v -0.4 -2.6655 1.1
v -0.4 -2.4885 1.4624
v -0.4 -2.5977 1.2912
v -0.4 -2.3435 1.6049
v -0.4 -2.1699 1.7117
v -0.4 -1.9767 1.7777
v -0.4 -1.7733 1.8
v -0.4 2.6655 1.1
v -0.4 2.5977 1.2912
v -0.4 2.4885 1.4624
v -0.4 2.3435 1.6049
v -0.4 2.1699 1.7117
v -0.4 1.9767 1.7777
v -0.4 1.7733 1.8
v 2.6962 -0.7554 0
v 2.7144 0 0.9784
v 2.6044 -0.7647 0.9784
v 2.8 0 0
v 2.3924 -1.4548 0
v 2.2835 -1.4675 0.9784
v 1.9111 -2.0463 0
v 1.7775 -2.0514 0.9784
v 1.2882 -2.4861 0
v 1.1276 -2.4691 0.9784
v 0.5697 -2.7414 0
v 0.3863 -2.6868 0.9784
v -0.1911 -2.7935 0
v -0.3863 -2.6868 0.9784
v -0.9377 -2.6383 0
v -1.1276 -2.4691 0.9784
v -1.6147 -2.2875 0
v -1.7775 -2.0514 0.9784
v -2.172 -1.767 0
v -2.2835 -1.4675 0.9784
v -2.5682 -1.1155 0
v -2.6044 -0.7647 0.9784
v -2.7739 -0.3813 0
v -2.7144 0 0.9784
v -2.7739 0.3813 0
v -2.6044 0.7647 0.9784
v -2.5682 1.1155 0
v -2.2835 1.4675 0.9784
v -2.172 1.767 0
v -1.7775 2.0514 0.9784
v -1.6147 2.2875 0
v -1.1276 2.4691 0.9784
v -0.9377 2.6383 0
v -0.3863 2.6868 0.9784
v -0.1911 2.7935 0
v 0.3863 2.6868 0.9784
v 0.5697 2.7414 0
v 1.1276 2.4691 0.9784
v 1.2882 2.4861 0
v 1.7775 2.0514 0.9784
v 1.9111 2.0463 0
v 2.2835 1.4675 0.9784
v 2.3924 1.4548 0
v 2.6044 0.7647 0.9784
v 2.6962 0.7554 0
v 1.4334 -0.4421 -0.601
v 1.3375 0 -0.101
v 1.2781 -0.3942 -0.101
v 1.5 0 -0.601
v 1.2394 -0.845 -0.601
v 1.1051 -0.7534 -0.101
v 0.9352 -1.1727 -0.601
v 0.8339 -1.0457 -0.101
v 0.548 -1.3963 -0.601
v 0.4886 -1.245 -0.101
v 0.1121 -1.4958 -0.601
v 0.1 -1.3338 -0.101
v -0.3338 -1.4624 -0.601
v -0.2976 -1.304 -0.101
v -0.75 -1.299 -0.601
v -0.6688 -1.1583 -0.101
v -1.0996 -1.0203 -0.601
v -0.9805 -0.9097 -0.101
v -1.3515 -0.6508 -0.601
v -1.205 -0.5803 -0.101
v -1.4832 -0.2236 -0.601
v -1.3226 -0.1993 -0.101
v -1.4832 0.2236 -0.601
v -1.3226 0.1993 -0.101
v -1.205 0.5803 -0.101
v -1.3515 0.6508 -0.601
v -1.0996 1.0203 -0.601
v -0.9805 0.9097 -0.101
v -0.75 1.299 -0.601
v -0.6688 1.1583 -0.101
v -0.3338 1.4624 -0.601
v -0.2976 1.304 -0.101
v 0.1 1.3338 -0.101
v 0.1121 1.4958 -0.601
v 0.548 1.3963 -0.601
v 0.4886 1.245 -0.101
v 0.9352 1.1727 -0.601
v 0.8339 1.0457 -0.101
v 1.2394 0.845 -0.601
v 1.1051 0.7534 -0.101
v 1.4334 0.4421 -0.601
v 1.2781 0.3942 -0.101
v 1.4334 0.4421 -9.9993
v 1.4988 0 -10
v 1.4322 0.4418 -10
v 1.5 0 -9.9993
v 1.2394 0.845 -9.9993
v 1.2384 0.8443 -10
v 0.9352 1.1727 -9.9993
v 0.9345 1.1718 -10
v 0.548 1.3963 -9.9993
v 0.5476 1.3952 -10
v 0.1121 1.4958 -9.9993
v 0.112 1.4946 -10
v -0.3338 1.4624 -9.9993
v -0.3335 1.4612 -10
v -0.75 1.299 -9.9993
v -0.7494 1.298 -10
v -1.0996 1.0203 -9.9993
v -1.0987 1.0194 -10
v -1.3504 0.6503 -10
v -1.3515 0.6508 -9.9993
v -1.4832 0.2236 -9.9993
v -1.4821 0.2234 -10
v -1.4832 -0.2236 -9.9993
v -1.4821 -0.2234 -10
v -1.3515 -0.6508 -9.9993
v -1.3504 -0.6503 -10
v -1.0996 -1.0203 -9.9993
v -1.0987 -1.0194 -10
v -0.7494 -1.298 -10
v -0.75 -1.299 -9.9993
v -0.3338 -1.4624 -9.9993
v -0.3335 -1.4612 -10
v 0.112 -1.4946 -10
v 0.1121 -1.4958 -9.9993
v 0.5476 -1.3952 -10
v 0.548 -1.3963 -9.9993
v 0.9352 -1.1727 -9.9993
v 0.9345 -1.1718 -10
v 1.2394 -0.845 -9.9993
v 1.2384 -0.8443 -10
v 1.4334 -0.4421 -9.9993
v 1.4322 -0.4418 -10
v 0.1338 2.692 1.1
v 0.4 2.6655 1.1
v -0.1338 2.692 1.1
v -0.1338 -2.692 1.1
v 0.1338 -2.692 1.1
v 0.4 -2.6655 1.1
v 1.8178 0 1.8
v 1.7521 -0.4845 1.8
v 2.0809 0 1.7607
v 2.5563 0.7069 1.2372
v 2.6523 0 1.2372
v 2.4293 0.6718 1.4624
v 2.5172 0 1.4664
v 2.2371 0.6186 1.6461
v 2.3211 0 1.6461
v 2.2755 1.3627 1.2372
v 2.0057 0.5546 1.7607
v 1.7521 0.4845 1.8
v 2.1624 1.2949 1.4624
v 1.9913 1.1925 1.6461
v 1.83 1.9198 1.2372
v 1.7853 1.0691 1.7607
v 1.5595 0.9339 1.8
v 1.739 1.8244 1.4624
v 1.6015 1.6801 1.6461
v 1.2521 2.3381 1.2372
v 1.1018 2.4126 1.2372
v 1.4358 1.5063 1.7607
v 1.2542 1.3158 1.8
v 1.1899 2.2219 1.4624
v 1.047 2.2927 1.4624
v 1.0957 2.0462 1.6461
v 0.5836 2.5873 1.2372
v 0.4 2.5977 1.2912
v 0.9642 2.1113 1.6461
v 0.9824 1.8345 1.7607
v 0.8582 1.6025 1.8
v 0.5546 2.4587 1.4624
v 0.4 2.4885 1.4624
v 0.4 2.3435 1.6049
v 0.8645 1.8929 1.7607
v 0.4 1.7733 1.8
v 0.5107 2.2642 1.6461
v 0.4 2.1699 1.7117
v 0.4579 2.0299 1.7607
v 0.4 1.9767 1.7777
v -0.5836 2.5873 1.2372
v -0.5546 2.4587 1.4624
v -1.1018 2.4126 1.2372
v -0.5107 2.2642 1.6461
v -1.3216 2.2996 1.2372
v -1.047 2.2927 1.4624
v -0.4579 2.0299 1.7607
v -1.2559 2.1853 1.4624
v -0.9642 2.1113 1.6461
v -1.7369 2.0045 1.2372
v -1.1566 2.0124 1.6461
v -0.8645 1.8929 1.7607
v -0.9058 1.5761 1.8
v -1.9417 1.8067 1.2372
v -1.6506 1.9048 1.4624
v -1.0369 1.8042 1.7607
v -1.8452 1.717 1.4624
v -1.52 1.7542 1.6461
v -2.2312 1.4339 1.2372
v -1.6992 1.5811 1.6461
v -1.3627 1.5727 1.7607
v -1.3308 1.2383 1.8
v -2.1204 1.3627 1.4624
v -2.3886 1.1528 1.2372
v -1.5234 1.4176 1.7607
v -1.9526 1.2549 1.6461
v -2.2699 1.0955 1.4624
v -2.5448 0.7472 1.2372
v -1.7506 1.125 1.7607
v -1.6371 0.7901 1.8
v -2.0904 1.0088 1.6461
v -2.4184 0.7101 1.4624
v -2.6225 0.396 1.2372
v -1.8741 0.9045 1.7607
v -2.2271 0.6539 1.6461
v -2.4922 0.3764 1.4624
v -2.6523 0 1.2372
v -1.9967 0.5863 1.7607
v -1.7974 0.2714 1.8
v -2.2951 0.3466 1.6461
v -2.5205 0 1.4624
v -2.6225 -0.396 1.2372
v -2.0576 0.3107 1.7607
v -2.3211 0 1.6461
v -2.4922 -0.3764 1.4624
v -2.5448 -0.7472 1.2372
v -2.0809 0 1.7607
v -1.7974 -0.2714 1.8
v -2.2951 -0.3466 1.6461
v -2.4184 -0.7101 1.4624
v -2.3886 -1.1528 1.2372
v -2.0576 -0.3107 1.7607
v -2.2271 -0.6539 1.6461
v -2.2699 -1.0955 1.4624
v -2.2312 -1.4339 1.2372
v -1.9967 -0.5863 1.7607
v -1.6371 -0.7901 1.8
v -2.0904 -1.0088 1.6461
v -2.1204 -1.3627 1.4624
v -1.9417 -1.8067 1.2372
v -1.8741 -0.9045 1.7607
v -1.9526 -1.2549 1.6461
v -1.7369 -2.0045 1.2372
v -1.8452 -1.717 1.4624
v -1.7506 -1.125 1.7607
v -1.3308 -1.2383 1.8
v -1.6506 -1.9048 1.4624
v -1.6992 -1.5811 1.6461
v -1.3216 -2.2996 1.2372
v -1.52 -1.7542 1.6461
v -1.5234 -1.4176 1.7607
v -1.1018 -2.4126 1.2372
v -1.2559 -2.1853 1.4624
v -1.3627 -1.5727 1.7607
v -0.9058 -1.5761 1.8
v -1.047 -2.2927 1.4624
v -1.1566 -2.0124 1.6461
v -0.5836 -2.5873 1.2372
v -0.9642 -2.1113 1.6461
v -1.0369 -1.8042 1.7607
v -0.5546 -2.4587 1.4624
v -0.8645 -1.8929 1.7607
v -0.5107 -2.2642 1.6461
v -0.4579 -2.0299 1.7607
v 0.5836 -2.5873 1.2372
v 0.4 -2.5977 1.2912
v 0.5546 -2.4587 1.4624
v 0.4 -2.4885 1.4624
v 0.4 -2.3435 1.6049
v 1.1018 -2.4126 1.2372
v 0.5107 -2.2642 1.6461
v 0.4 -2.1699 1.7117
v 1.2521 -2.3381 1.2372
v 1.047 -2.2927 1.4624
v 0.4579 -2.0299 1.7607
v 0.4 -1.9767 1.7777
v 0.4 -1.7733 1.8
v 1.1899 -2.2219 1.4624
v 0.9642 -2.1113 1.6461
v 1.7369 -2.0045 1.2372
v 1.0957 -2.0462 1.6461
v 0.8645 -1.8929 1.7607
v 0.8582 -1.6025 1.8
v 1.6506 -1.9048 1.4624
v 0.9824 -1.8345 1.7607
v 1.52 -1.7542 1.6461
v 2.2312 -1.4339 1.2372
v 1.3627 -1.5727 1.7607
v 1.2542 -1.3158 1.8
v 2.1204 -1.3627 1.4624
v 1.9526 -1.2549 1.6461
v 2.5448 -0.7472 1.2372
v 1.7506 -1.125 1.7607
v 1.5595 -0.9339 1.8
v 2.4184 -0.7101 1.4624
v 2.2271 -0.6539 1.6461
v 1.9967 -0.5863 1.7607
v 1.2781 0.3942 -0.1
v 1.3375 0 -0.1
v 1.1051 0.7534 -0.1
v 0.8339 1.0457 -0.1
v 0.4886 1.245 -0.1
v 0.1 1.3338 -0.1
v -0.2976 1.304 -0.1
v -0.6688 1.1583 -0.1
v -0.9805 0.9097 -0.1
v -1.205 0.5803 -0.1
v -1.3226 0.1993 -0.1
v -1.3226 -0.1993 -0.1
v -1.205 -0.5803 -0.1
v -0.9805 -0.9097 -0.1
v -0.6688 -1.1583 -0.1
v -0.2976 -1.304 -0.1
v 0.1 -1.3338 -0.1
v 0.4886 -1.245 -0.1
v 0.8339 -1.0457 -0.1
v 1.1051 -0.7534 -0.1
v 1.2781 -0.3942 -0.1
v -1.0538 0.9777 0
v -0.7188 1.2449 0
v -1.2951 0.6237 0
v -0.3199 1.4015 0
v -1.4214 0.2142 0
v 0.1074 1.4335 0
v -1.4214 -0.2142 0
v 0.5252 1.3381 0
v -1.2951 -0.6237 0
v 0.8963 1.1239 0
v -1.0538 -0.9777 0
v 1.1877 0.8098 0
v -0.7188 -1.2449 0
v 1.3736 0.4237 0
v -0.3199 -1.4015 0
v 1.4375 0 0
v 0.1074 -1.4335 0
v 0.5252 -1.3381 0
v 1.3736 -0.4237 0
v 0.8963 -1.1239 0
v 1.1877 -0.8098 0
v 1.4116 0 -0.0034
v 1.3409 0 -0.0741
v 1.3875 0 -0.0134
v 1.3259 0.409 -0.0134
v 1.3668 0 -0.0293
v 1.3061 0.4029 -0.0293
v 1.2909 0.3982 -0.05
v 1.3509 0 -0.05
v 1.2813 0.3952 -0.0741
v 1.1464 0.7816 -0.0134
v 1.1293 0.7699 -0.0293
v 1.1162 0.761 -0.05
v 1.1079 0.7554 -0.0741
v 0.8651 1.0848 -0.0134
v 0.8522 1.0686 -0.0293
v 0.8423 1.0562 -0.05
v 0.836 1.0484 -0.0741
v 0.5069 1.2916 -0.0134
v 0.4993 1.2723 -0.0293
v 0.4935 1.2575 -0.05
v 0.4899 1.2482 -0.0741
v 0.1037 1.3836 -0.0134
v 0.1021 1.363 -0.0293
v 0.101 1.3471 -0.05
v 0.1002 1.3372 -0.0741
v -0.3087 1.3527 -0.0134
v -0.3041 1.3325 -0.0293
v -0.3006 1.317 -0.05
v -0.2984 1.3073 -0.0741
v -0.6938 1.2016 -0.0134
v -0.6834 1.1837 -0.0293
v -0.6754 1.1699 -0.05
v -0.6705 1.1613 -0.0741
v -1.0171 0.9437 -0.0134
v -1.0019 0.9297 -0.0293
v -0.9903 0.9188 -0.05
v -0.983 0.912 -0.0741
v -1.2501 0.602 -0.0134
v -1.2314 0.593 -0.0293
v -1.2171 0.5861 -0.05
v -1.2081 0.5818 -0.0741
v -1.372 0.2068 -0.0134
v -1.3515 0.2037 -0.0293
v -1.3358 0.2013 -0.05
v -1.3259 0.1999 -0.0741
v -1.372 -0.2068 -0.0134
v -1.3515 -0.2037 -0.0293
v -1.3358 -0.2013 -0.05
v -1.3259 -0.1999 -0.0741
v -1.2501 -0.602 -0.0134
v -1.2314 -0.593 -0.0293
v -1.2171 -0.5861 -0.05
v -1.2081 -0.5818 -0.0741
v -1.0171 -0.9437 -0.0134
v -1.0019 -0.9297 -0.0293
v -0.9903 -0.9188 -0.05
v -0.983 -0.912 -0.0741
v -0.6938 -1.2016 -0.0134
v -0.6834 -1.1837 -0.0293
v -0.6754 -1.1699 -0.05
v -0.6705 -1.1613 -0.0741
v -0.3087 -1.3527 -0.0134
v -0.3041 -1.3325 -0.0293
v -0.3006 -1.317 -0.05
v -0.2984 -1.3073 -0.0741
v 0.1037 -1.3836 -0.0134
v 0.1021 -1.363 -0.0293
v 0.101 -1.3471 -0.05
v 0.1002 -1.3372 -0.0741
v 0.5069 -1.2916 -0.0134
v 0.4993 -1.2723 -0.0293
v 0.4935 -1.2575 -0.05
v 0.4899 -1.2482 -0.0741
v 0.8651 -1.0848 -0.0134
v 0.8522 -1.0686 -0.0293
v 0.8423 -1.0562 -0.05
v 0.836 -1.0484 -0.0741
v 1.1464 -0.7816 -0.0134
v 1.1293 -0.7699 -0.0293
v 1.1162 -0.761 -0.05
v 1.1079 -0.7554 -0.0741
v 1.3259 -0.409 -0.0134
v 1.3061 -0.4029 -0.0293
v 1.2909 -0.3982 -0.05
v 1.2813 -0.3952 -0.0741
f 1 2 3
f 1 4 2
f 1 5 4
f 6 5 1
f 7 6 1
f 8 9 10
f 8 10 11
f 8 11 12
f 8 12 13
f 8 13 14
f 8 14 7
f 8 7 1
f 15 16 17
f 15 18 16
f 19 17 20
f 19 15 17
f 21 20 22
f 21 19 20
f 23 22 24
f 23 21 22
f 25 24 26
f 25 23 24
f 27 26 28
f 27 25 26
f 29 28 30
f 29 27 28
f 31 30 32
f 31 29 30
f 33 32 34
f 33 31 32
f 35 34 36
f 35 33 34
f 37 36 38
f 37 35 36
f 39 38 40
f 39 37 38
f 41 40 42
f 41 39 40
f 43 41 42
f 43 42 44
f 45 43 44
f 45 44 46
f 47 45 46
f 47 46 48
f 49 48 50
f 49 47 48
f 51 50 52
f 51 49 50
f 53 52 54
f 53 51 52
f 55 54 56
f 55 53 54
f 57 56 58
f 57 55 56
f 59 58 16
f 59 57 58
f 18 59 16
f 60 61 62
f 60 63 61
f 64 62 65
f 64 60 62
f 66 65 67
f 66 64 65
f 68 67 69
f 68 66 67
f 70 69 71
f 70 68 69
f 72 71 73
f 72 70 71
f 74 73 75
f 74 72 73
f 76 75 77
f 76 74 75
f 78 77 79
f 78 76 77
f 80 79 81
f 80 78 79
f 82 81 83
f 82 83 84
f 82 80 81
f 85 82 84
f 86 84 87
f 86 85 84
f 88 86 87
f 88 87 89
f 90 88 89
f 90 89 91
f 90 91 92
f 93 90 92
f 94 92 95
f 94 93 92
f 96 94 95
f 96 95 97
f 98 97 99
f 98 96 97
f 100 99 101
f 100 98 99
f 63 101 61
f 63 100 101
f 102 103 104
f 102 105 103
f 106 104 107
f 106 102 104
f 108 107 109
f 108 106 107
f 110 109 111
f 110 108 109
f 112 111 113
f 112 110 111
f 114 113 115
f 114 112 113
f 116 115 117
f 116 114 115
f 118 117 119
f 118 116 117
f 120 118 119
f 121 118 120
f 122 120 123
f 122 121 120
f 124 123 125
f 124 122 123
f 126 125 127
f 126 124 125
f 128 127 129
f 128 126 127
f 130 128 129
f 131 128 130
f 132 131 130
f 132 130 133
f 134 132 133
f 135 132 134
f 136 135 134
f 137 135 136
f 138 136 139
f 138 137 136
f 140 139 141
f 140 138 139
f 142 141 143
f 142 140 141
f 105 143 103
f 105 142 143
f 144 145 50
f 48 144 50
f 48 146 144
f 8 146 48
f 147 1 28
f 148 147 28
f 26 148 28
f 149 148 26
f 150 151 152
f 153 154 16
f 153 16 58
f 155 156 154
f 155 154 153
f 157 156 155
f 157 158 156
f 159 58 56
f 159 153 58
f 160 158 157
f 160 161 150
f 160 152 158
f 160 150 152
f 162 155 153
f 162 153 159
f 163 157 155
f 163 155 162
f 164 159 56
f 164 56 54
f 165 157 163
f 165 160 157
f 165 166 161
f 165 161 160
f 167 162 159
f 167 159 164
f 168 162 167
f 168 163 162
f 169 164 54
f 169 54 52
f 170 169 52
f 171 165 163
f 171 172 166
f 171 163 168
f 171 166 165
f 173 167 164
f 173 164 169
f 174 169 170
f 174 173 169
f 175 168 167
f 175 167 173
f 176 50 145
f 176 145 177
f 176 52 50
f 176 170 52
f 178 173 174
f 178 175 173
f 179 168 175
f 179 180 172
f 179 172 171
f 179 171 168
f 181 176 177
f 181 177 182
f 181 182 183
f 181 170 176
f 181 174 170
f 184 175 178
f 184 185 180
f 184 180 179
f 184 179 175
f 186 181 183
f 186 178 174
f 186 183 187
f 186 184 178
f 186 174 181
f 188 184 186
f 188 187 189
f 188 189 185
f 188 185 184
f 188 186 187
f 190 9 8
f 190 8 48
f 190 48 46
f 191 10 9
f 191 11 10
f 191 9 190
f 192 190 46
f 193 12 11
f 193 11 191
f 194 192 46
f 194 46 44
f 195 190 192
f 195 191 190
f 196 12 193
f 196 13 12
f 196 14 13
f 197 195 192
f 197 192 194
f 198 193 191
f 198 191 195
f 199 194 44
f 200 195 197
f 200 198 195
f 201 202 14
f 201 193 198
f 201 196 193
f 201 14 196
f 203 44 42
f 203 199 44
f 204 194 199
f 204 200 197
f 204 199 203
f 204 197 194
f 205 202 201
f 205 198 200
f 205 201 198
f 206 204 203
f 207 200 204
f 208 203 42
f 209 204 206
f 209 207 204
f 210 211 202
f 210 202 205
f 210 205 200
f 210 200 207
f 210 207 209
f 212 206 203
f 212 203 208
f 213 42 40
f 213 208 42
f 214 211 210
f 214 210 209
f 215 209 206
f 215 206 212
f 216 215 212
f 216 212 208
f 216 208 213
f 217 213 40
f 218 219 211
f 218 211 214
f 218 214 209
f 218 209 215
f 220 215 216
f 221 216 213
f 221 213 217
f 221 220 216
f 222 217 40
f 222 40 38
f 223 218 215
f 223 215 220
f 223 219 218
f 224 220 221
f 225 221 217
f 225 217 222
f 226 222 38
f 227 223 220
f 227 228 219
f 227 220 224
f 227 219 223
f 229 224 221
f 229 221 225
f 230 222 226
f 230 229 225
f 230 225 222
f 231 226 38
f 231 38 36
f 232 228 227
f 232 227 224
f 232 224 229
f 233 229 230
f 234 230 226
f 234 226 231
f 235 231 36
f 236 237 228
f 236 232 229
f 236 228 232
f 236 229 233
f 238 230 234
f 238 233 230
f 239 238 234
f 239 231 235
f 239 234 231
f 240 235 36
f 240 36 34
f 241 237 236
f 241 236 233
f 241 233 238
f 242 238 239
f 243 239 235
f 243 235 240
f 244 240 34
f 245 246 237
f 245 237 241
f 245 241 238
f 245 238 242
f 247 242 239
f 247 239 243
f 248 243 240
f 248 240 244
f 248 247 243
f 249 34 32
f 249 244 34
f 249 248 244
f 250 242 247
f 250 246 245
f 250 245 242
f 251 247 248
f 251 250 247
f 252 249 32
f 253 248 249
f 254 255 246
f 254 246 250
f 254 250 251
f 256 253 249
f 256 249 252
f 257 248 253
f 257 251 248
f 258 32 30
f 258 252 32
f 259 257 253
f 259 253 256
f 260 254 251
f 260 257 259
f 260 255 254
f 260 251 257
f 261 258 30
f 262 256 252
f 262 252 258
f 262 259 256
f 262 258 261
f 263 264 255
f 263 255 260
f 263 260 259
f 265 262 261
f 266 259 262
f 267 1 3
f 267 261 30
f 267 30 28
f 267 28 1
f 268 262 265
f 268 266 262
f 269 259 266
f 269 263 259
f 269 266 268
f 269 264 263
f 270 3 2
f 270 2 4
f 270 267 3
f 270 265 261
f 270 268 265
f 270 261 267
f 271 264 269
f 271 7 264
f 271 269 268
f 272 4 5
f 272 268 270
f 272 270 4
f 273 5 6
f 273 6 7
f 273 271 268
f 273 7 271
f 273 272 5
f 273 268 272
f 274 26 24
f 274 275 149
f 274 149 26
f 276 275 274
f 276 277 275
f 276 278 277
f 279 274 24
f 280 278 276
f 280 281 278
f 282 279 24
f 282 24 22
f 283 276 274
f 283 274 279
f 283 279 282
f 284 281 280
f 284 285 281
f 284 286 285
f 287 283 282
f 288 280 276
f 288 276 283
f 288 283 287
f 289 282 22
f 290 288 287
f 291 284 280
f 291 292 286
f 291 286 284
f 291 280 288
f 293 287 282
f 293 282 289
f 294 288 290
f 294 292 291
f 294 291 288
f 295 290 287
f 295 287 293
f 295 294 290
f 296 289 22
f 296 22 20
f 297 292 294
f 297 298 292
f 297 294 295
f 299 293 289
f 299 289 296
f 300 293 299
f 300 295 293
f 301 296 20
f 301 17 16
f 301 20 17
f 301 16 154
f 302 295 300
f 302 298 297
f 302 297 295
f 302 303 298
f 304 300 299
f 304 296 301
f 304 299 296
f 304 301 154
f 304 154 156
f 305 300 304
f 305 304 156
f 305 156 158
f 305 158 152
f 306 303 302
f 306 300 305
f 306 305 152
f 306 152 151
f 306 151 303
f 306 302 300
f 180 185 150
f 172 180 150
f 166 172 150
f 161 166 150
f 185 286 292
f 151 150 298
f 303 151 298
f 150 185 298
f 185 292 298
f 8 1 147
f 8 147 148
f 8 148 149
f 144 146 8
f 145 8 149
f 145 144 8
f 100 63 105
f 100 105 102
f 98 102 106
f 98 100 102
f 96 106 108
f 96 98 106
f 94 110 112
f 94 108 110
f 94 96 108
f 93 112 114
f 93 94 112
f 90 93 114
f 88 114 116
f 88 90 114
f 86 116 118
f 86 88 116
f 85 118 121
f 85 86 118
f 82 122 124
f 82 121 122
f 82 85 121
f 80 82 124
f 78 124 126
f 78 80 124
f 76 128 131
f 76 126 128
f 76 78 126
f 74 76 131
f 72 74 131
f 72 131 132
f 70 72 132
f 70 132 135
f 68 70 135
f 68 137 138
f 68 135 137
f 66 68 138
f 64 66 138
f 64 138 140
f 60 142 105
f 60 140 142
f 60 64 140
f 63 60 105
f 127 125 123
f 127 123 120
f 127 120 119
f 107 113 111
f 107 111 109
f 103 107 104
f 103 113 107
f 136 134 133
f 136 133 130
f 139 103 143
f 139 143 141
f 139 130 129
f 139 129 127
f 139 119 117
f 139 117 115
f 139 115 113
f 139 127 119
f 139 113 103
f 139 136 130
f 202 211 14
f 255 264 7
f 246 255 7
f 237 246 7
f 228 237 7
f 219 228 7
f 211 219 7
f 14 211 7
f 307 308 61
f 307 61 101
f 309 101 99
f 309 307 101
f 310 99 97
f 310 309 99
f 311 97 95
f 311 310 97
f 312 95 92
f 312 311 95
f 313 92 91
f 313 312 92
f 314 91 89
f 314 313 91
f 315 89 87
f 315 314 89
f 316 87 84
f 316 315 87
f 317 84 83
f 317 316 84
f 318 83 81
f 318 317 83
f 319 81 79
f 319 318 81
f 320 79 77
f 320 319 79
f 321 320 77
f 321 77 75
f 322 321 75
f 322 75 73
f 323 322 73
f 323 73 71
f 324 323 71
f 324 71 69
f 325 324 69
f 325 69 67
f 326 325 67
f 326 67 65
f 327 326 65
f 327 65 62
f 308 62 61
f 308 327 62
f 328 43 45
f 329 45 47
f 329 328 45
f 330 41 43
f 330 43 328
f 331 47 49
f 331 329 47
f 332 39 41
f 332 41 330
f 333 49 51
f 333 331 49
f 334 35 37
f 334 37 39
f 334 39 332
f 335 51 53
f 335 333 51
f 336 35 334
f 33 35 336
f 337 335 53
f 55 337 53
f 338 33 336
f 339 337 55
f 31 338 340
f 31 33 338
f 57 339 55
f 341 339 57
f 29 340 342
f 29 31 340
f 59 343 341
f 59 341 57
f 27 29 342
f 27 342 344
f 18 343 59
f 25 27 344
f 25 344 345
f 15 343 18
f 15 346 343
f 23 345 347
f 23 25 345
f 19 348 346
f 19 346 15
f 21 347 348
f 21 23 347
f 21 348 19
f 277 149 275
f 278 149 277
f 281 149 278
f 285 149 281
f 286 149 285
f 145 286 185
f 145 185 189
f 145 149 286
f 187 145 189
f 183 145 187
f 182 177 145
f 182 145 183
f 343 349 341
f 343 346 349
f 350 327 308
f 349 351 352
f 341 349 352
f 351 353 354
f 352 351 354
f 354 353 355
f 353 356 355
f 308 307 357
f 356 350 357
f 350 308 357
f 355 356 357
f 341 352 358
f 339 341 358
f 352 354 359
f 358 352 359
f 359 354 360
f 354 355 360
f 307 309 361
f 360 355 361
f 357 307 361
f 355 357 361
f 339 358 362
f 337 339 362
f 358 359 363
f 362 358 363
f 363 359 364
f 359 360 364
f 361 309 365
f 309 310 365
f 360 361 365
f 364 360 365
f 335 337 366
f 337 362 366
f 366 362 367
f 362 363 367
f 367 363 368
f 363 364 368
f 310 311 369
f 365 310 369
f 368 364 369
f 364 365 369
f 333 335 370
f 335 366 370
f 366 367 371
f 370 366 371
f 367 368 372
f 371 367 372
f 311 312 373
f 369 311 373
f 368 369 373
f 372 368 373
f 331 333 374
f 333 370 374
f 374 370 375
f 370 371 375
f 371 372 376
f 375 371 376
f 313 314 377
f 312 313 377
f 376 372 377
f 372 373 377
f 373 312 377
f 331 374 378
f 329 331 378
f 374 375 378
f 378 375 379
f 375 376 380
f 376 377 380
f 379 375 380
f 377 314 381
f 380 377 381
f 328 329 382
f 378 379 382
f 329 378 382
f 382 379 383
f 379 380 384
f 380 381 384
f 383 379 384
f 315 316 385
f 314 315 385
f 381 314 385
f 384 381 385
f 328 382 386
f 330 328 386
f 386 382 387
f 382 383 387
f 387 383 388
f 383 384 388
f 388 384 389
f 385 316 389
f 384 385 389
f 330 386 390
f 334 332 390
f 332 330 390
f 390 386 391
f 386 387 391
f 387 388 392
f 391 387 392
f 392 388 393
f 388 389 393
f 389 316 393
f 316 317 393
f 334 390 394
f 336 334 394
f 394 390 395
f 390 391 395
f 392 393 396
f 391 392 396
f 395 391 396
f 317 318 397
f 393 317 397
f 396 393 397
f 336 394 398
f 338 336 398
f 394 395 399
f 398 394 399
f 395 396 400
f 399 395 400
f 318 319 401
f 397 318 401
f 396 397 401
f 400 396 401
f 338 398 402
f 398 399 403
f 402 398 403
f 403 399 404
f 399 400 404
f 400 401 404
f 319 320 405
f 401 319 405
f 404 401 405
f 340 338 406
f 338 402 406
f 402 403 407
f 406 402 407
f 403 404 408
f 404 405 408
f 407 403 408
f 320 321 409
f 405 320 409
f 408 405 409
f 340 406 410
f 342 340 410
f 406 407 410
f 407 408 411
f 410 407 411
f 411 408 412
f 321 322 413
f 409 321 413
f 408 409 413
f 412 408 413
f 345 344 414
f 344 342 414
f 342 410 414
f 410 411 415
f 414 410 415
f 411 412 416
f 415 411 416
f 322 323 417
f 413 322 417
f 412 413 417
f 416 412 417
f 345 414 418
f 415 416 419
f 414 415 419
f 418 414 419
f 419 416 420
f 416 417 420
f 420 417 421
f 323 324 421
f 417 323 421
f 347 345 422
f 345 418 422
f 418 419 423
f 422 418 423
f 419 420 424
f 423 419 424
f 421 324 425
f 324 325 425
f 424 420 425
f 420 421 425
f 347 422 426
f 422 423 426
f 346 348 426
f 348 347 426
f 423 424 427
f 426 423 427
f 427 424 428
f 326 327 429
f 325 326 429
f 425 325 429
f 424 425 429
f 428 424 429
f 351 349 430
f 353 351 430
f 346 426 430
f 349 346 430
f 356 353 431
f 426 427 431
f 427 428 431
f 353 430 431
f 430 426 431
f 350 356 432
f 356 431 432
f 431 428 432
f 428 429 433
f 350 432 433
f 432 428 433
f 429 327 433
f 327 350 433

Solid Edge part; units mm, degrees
sketch "Sketch1" plane through (0, 0, 0) normal (0, -1, 0) x (1, 0, 0)
  line L0 (0, -10) -> (1.5, -10)
  line L1 (1.5, -10) -> (1.5, -0.601)
  line L2 (1.5, -0.601) -> (1.3375, -0.101)
  line L3 (1.3375, -0.101) -> (1.3375, 0)
  line L4 (1.3375, 0) -> (2.8, 0)
  line L5 (2.8, 0) -> (2.6425, 1.8)
  line L6 (2.6425, 1.8) -> (0, 1.8)
  dimension "D1" = 1.5
  dimension "D2" = 1.3375
  dimension "D3" = 10
  dimension "D4" = 9.399
  dimension "D5" = 0.5
  dimension "D6" = 2.8
  dimension "D7" = 1.8
revolve "RevolvedProtrusion1" add sketch "Sketch1" angle 360 about axis through (0, 0, 6) along (0, 0, -1)
fillet "Round_1" radius 0.9 1 edges at (-2.6425, 0, 1.8)
sketch "Sketch2" plane through (0, 0, 0) normal (0, -1, 0) x (1, 0, 0)
  line L0 (-0.4, 1.8) -> (-0.4, 1.1)
  line L1 (-0.4, 1.1) -> (0.4, 1.1)
  line L2 (0.4, 1.1) -> (0.4, 1.8)
  line L3 (0.4, 1.8) -> (-0.4, 1.8)
  dimension "D1" = 0.8
  dimension "D2" = 0.7
  dimension "D3" = 1.8
extrude "ExtrudedCutout_1" cut sketch "Sketch2" along normal mid plane 5.6
cosmetic_thread "Thread_1" size "M3" thread depth 9.399
fillet "Round_2" radius 0.1 1 edges at (-1.3375, 0, 0)
chamfer "Chamfer_1" distance 0.0012 angle 30 1 edges at (-1.5, 0, -10) measured on face at (1.03, 0.97, -10)
properties material "Steel"
